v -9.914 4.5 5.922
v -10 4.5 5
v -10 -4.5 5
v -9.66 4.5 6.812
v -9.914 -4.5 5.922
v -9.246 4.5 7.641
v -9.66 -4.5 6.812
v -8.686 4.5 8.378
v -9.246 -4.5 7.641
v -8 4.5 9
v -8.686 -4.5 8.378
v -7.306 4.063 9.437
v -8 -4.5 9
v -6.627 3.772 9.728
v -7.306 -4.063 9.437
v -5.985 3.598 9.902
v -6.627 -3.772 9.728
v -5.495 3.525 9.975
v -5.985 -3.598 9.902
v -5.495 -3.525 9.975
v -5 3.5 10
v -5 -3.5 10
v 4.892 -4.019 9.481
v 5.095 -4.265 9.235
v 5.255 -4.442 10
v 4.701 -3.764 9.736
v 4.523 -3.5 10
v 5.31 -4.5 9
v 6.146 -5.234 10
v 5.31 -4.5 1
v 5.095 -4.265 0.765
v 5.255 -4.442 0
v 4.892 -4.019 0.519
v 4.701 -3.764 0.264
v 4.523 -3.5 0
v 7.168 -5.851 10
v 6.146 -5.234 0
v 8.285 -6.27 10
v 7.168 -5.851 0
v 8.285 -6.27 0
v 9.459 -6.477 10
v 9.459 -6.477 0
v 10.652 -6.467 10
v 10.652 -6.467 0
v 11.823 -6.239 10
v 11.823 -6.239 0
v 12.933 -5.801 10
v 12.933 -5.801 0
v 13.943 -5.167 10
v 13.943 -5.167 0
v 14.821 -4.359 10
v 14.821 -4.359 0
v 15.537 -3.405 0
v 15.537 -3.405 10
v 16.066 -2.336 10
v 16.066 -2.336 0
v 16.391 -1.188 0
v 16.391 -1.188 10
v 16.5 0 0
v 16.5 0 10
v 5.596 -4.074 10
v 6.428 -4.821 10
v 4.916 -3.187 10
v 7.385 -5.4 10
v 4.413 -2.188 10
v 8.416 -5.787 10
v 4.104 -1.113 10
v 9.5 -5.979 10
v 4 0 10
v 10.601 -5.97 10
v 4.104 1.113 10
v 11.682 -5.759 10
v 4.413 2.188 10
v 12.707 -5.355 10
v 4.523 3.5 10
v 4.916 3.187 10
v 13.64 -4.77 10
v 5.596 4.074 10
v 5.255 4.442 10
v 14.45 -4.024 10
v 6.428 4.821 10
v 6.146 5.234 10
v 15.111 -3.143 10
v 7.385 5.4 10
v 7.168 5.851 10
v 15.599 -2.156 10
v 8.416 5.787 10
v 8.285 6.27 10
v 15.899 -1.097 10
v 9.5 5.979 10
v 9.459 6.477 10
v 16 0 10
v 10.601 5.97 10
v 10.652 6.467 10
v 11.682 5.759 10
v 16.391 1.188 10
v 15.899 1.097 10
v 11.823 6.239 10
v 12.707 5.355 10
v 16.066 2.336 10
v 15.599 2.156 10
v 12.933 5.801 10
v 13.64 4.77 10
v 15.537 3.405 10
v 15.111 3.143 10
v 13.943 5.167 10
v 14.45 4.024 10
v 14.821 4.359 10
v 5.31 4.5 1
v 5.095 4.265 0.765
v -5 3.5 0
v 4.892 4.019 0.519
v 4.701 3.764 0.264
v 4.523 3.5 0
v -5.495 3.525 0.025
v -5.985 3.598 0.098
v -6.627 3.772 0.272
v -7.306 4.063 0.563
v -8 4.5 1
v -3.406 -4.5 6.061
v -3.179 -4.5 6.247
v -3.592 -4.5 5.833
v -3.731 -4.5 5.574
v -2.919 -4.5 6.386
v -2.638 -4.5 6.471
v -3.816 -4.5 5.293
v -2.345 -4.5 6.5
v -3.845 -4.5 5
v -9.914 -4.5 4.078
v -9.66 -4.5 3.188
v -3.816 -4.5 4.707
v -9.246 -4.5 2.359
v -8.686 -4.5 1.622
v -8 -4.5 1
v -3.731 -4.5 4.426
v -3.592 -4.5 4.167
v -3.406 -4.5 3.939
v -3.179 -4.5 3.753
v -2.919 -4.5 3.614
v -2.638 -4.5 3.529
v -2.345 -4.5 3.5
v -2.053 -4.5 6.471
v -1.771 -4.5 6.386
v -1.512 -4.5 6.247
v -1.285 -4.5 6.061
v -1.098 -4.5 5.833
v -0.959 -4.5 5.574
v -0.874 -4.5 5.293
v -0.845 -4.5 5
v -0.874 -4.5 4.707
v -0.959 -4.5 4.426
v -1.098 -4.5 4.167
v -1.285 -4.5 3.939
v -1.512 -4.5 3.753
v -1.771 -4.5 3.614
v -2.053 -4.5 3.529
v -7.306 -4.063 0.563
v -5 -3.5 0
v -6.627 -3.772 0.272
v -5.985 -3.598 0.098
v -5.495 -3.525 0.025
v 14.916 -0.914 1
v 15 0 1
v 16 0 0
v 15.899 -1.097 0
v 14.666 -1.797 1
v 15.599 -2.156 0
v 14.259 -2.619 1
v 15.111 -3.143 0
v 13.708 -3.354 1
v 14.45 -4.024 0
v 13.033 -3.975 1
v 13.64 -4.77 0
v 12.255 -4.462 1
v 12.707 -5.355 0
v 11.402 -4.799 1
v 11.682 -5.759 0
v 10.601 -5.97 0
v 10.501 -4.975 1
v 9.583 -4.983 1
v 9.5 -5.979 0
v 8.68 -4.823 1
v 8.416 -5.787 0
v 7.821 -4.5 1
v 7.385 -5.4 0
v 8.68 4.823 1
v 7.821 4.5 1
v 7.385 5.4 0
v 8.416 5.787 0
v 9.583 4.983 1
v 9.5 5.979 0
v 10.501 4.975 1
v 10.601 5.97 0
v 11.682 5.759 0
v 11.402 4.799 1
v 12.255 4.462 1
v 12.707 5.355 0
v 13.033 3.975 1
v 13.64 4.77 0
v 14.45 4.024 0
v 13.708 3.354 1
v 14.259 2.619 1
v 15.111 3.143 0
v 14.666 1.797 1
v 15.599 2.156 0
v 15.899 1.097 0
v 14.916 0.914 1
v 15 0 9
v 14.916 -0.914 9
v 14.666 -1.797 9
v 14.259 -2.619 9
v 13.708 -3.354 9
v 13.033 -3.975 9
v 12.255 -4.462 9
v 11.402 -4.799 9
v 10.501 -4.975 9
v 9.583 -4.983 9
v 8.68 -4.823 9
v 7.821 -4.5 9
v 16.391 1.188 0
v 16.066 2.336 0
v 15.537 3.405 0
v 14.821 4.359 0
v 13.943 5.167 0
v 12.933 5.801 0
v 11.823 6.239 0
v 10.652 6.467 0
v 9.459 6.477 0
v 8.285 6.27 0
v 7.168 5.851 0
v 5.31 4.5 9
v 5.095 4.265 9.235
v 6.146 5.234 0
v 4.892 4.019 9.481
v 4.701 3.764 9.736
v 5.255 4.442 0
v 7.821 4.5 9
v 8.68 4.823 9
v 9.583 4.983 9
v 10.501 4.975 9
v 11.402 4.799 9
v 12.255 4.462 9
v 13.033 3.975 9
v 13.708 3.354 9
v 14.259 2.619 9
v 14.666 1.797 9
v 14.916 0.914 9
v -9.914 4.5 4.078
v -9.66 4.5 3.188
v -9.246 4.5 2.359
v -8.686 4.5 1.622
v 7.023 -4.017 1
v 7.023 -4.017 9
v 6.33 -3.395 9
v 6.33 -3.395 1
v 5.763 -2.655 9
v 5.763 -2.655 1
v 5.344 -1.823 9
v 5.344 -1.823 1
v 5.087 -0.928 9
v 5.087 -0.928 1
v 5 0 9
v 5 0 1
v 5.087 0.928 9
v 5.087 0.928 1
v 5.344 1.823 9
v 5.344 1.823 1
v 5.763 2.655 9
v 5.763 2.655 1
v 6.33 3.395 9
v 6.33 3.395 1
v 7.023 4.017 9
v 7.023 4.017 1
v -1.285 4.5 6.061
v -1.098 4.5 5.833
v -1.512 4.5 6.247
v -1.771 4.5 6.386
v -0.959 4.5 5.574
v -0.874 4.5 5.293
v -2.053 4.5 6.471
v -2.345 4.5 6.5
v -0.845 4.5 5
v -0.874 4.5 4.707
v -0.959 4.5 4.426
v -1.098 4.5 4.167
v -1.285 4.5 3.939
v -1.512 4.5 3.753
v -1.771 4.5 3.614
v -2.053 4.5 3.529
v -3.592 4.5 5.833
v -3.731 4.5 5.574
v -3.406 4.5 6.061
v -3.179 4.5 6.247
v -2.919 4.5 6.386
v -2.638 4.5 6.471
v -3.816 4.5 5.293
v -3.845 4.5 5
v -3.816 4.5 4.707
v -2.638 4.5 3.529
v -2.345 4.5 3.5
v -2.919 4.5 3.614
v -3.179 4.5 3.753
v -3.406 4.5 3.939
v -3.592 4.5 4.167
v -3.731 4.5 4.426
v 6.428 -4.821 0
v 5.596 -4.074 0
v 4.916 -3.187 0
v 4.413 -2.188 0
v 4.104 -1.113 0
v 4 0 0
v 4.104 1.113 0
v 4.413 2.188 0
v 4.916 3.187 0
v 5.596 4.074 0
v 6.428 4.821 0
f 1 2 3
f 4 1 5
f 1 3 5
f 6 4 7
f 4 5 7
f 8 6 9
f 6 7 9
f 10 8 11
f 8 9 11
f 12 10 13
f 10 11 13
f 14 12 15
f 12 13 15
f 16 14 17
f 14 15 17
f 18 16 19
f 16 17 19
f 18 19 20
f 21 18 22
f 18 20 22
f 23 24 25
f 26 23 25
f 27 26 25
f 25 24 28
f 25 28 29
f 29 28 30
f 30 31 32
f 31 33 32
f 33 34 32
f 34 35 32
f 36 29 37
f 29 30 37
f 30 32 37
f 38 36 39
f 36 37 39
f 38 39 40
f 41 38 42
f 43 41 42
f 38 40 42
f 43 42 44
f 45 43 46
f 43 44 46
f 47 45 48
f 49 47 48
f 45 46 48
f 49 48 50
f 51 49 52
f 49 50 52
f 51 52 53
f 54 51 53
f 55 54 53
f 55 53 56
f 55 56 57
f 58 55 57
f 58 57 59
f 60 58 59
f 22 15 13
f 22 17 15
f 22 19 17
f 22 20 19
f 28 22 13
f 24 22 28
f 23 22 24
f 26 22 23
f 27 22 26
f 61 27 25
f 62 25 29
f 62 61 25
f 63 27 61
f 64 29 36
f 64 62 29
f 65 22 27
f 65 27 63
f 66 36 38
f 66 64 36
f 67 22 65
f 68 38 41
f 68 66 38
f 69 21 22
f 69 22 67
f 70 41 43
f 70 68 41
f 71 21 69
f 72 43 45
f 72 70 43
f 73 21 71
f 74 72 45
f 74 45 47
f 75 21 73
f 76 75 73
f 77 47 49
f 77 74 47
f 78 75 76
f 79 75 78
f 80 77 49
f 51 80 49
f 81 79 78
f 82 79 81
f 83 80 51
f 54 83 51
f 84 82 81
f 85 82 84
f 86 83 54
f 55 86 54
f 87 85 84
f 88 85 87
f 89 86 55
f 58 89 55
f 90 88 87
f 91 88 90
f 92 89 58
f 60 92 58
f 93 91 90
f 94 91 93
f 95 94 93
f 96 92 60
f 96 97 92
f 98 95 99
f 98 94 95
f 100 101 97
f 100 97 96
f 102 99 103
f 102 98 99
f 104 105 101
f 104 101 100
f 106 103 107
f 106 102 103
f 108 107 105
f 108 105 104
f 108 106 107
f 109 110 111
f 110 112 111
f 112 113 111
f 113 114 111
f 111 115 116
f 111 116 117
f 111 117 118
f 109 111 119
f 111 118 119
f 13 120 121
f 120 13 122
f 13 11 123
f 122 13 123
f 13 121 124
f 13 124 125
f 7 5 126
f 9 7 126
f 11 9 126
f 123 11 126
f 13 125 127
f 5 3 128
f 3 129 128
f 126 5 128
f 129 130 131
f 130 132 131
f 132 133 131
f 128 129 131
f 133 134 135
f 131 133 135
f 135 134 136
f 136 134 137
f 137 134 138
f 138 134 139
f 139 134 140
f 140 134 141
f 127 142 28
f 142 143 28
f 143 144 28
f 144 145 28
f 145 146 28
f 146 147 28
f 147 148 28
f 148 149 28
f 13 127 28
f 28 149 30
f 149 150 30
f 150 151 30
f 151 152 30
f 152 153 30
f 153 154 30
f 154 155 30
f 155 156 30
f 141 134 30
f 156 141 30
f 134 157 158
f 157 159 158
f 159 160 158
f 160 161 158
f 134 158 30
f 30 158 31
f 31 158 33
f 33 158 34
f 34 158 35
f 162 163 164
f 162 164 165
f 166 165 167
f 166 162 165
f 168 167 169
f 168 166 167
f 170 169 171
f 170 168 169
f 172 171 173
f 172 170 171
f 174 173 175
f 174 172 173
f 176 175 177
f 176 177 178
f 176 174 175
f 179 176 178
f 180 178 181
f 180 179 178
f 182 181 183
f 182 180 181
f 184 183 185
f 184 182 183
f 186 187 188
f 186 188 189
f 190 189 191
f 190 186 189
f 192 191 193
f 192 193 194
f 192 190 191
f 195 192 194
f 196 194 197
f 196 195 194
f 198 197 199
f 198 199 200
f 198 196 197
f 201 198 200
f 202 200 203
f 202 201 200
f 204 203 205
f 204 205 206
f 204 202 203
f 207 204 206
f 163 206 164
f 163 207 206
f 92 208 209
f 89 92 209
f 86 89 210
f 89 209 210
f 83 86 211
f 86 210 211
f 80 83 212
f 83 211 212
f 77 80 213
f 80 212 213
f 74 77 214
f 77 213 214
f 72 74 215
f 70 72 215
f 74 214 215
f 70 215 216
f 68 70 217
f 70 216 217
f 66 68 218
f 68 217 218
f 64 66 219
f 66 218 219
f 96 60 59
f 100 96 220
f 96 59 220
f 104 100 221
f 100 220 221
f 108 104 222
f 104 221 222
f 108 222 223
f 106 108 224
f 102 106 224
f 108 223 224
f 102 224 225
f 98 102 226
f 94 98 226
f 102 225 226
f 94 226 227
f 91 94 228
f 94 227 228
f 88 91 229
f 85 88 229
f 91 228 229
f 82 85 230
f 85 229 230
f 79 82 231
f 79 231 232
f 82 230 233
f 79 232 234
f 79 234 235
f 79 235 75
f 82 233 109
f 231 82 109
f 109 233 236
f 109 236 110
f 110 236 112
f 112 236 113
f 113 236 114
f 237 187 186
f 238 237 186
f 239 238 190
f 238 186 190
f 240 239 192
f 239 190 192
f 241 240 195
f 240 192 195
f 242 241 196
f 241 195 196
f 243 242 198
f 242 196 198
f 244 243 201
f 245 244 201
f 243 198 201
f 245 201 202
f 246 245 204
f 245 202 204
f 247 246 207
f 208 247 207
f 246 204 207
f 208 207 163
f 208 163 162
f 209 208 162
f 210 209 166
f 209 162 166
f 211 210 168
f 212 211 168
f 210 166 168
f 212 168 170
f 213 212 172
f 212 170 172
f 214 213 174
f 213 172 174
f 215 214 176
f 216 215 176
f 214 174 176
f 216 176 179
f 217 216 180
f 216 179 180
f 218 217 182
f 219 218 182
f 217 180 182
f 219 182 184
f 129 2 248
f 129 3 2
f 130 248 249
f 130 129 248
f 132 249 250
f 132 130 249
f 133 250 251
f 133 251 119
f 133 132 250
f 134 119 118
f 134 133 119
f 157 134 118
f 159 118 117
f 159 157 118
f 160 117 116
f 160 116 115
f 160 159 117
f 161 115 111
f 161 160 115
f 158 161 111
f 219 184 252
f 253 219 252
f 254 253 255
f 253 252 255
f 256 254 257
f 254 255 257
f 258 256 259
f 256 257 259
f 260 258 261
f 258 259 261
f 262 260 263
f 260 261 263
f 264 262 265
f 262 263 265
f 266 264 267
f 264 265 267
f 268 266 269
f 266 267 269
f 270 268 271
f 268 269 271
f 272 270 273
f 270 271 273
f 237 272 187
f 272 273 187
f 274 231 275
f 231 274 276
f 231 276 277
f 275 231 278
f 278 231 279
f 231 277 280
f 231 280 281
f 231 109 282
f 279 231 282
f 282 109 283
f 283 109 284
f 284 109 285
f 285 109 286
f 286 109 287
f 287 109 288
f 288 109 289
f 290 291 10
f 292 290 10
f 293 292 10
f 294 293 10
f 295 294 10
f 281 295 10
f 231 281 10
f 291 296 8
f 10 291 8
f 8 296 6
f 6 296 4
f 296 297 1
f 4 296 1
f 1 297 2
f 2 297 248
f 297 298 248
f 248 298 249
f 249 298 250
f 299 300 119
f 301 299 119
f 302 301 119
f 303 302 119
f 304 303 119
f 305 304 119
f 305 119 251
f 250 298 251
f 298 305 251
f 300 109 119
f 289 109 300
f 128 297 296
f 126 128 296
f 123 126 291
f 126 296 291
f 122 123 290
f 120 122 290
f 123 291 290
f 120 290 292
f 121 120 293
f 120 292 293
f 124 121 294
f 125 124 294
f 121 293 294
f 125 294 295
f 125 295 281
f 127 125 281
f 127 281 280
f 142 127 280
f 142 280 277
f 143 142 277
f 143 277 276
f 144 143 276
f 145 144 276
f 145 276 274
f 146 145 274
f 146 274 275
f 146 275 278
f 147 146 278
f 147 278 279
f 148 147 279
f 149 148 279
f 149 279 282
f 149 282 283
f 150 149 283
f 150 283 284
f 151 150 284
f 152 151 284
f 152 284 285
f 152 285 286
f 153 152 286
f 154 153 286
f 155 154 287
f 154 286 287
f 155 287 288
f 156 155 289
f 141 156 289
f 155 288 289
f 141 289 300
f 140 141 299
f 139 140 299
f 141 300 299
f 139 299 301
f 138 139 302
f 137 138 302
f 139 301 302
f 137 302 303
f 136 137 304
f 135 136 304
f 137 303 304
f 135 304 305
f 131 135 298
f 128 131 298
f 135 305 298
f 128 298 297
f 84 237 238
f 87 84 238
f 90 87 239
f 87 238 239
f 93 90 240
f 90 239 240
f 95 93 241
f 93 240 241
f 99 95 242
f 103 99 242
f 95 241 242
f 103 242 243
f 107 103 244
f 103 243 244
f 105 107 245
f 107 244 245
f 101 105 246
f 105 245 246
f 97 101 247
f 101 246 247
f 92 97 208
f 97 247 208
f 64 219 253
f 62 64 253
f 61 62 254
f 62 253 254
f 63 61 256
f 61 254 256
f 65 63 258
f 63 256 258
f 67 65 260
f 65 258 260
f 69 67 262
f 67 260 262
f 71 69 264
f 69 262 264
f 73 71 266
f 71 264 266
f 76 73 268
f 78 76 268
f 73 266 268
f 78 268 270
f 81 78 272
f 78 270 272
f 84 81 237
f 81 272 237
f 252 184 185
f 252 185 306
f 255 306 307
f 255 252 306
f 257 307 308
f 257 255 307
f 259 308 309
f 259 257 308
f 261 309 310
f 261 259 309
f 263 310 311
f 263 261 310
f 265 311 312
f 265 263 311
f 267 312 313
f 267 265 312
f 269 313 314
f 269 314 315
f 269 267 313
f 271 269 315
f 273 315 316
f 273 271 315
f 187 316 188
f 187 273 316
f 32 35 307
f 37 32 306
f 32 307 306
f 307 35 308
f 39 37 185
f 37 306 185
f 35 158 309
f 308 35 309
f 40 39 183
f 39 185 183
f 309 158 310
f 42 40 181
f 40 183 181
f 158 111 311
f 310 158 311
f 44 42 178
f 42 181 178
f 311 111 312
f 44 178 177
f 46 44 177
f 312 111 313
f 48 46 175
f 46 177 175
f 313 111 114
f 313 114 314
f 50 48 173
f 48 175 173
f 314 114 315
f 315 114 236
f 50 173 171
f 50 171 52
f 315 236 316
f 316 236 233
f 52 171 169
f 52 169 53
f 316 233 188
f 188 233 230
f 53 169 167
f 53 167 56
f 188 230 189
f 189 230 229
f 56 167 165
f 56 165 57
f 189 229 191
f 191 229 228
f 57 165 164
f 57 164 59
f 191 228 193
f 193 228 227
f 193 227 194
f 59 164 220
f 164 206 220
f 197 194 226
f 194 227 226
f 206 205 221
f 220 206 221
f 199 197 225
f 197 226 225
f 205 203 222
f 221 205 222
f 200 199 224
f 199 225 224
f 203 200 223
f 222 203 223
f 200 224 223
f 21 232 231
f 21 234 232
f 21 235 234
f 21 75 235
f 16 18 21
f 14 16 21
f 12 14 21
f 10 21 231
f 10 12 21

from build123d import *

# Parameters (mm, degrees)
F1_DEPTH = 10
F3_D     = 3
F3_DEPTH = 30
F3_TIP   = 0.9012909285
F4_SIZE  = 1
F5_R     = 4.99999


# Not quite as in the source:
# - a fillet or chamfer is up to 0.001 mm smaller than in the source, because OpenCascade refuses the exact size


with BuildPart() as f1:
    # F0 (on Top) → F1 (new body)
    with BuildSketch(Plane.XY):
        with BuildLine():
            Line((5.3095842402, 4.5), (-10, 4.5))
            Line((-10, 4.5), (-10, -4.5))
            Line((-10, -4.5), (5.3095842402, -4.5))
            ThreePointArc((5.3095842402, -4.5), (3.5, 0), (5.3095842402, 4.5))
        make_face()
        with BuildLine():
            Line((7.8205505282, 4.5), (5.3095842402, 4.5))
            ThreePointArc((5.3095842402, 4.5), (3.5, 0), (5.3095842402, -4.5))
            Line((5.3095842402, -4.5), (7.8205505282, -4.5))
            ThreePointArc((7.8205505282, -4.5), (5, 0), (7.8205505282, 4.5))
        make_face()
        with BuildLine():
            ThreePointArc((16.5, 0), (12.4251079936, 6.0306592691), (5.3095842402, 4.5))
            Line((5.3095842402, 4.5), (7.8205505282, 4.5))
            ThreePointArc((7.8205505282, 4.5), (12.655442773, 4.2365816031), (15, 0))
            ThreePointArc((15, 0), (12.655442773, -4.2365816031), (7.8205505282, -4.5))
            Line((7.8205505282, -4.5), (5.3095842402, -4.5))
            ThreePointArc((5.3095842402, -4.5), (12.4251079936, -6.0306592691), (16.5, 0))
        make_face()
    extrude(amount=F1_DEPTH)

    # F3
    with Locations(Plane.XZ.offset(4.5)):
        with Locations((-2.3452078799, 5)):
            Hole(F3_D / 2, depth=F3_DEPTH)
            with Locations((0, 0, -(F3_DEPTH + F3_TIP / 2))):  # 118° drill point
                Cone(0, F3_D / 2, F3_TIP, mode=Mode.SUBTRACT)

    # F4
    f4_edges = [f1.edges().sort_by_distance(p)[0] for p in [
        (12.179449, -4.5, 10),
        (12.179449, -4.5, 0),
        (-2.345208, 4.5, 10),
        (-2.345208, -4.5, 10),
        (-2.345208, -4.5, 0),
        (-2.345208, 4.5, 0),
    ]]
    chamfer(f4_edges, length=F4_SIZE)

    # F5 (radius 5 in the source; OpenCascade refuses exactly that, so slightly less here)
    f5_edges = [f1.edges().sort_by_distance(p)[0] for p in [
        (-10, 0, 10),
        (-10, 0, 0),
    ]]
    fillet(f5_edges, radius=F5_R)


solid = f1.part
